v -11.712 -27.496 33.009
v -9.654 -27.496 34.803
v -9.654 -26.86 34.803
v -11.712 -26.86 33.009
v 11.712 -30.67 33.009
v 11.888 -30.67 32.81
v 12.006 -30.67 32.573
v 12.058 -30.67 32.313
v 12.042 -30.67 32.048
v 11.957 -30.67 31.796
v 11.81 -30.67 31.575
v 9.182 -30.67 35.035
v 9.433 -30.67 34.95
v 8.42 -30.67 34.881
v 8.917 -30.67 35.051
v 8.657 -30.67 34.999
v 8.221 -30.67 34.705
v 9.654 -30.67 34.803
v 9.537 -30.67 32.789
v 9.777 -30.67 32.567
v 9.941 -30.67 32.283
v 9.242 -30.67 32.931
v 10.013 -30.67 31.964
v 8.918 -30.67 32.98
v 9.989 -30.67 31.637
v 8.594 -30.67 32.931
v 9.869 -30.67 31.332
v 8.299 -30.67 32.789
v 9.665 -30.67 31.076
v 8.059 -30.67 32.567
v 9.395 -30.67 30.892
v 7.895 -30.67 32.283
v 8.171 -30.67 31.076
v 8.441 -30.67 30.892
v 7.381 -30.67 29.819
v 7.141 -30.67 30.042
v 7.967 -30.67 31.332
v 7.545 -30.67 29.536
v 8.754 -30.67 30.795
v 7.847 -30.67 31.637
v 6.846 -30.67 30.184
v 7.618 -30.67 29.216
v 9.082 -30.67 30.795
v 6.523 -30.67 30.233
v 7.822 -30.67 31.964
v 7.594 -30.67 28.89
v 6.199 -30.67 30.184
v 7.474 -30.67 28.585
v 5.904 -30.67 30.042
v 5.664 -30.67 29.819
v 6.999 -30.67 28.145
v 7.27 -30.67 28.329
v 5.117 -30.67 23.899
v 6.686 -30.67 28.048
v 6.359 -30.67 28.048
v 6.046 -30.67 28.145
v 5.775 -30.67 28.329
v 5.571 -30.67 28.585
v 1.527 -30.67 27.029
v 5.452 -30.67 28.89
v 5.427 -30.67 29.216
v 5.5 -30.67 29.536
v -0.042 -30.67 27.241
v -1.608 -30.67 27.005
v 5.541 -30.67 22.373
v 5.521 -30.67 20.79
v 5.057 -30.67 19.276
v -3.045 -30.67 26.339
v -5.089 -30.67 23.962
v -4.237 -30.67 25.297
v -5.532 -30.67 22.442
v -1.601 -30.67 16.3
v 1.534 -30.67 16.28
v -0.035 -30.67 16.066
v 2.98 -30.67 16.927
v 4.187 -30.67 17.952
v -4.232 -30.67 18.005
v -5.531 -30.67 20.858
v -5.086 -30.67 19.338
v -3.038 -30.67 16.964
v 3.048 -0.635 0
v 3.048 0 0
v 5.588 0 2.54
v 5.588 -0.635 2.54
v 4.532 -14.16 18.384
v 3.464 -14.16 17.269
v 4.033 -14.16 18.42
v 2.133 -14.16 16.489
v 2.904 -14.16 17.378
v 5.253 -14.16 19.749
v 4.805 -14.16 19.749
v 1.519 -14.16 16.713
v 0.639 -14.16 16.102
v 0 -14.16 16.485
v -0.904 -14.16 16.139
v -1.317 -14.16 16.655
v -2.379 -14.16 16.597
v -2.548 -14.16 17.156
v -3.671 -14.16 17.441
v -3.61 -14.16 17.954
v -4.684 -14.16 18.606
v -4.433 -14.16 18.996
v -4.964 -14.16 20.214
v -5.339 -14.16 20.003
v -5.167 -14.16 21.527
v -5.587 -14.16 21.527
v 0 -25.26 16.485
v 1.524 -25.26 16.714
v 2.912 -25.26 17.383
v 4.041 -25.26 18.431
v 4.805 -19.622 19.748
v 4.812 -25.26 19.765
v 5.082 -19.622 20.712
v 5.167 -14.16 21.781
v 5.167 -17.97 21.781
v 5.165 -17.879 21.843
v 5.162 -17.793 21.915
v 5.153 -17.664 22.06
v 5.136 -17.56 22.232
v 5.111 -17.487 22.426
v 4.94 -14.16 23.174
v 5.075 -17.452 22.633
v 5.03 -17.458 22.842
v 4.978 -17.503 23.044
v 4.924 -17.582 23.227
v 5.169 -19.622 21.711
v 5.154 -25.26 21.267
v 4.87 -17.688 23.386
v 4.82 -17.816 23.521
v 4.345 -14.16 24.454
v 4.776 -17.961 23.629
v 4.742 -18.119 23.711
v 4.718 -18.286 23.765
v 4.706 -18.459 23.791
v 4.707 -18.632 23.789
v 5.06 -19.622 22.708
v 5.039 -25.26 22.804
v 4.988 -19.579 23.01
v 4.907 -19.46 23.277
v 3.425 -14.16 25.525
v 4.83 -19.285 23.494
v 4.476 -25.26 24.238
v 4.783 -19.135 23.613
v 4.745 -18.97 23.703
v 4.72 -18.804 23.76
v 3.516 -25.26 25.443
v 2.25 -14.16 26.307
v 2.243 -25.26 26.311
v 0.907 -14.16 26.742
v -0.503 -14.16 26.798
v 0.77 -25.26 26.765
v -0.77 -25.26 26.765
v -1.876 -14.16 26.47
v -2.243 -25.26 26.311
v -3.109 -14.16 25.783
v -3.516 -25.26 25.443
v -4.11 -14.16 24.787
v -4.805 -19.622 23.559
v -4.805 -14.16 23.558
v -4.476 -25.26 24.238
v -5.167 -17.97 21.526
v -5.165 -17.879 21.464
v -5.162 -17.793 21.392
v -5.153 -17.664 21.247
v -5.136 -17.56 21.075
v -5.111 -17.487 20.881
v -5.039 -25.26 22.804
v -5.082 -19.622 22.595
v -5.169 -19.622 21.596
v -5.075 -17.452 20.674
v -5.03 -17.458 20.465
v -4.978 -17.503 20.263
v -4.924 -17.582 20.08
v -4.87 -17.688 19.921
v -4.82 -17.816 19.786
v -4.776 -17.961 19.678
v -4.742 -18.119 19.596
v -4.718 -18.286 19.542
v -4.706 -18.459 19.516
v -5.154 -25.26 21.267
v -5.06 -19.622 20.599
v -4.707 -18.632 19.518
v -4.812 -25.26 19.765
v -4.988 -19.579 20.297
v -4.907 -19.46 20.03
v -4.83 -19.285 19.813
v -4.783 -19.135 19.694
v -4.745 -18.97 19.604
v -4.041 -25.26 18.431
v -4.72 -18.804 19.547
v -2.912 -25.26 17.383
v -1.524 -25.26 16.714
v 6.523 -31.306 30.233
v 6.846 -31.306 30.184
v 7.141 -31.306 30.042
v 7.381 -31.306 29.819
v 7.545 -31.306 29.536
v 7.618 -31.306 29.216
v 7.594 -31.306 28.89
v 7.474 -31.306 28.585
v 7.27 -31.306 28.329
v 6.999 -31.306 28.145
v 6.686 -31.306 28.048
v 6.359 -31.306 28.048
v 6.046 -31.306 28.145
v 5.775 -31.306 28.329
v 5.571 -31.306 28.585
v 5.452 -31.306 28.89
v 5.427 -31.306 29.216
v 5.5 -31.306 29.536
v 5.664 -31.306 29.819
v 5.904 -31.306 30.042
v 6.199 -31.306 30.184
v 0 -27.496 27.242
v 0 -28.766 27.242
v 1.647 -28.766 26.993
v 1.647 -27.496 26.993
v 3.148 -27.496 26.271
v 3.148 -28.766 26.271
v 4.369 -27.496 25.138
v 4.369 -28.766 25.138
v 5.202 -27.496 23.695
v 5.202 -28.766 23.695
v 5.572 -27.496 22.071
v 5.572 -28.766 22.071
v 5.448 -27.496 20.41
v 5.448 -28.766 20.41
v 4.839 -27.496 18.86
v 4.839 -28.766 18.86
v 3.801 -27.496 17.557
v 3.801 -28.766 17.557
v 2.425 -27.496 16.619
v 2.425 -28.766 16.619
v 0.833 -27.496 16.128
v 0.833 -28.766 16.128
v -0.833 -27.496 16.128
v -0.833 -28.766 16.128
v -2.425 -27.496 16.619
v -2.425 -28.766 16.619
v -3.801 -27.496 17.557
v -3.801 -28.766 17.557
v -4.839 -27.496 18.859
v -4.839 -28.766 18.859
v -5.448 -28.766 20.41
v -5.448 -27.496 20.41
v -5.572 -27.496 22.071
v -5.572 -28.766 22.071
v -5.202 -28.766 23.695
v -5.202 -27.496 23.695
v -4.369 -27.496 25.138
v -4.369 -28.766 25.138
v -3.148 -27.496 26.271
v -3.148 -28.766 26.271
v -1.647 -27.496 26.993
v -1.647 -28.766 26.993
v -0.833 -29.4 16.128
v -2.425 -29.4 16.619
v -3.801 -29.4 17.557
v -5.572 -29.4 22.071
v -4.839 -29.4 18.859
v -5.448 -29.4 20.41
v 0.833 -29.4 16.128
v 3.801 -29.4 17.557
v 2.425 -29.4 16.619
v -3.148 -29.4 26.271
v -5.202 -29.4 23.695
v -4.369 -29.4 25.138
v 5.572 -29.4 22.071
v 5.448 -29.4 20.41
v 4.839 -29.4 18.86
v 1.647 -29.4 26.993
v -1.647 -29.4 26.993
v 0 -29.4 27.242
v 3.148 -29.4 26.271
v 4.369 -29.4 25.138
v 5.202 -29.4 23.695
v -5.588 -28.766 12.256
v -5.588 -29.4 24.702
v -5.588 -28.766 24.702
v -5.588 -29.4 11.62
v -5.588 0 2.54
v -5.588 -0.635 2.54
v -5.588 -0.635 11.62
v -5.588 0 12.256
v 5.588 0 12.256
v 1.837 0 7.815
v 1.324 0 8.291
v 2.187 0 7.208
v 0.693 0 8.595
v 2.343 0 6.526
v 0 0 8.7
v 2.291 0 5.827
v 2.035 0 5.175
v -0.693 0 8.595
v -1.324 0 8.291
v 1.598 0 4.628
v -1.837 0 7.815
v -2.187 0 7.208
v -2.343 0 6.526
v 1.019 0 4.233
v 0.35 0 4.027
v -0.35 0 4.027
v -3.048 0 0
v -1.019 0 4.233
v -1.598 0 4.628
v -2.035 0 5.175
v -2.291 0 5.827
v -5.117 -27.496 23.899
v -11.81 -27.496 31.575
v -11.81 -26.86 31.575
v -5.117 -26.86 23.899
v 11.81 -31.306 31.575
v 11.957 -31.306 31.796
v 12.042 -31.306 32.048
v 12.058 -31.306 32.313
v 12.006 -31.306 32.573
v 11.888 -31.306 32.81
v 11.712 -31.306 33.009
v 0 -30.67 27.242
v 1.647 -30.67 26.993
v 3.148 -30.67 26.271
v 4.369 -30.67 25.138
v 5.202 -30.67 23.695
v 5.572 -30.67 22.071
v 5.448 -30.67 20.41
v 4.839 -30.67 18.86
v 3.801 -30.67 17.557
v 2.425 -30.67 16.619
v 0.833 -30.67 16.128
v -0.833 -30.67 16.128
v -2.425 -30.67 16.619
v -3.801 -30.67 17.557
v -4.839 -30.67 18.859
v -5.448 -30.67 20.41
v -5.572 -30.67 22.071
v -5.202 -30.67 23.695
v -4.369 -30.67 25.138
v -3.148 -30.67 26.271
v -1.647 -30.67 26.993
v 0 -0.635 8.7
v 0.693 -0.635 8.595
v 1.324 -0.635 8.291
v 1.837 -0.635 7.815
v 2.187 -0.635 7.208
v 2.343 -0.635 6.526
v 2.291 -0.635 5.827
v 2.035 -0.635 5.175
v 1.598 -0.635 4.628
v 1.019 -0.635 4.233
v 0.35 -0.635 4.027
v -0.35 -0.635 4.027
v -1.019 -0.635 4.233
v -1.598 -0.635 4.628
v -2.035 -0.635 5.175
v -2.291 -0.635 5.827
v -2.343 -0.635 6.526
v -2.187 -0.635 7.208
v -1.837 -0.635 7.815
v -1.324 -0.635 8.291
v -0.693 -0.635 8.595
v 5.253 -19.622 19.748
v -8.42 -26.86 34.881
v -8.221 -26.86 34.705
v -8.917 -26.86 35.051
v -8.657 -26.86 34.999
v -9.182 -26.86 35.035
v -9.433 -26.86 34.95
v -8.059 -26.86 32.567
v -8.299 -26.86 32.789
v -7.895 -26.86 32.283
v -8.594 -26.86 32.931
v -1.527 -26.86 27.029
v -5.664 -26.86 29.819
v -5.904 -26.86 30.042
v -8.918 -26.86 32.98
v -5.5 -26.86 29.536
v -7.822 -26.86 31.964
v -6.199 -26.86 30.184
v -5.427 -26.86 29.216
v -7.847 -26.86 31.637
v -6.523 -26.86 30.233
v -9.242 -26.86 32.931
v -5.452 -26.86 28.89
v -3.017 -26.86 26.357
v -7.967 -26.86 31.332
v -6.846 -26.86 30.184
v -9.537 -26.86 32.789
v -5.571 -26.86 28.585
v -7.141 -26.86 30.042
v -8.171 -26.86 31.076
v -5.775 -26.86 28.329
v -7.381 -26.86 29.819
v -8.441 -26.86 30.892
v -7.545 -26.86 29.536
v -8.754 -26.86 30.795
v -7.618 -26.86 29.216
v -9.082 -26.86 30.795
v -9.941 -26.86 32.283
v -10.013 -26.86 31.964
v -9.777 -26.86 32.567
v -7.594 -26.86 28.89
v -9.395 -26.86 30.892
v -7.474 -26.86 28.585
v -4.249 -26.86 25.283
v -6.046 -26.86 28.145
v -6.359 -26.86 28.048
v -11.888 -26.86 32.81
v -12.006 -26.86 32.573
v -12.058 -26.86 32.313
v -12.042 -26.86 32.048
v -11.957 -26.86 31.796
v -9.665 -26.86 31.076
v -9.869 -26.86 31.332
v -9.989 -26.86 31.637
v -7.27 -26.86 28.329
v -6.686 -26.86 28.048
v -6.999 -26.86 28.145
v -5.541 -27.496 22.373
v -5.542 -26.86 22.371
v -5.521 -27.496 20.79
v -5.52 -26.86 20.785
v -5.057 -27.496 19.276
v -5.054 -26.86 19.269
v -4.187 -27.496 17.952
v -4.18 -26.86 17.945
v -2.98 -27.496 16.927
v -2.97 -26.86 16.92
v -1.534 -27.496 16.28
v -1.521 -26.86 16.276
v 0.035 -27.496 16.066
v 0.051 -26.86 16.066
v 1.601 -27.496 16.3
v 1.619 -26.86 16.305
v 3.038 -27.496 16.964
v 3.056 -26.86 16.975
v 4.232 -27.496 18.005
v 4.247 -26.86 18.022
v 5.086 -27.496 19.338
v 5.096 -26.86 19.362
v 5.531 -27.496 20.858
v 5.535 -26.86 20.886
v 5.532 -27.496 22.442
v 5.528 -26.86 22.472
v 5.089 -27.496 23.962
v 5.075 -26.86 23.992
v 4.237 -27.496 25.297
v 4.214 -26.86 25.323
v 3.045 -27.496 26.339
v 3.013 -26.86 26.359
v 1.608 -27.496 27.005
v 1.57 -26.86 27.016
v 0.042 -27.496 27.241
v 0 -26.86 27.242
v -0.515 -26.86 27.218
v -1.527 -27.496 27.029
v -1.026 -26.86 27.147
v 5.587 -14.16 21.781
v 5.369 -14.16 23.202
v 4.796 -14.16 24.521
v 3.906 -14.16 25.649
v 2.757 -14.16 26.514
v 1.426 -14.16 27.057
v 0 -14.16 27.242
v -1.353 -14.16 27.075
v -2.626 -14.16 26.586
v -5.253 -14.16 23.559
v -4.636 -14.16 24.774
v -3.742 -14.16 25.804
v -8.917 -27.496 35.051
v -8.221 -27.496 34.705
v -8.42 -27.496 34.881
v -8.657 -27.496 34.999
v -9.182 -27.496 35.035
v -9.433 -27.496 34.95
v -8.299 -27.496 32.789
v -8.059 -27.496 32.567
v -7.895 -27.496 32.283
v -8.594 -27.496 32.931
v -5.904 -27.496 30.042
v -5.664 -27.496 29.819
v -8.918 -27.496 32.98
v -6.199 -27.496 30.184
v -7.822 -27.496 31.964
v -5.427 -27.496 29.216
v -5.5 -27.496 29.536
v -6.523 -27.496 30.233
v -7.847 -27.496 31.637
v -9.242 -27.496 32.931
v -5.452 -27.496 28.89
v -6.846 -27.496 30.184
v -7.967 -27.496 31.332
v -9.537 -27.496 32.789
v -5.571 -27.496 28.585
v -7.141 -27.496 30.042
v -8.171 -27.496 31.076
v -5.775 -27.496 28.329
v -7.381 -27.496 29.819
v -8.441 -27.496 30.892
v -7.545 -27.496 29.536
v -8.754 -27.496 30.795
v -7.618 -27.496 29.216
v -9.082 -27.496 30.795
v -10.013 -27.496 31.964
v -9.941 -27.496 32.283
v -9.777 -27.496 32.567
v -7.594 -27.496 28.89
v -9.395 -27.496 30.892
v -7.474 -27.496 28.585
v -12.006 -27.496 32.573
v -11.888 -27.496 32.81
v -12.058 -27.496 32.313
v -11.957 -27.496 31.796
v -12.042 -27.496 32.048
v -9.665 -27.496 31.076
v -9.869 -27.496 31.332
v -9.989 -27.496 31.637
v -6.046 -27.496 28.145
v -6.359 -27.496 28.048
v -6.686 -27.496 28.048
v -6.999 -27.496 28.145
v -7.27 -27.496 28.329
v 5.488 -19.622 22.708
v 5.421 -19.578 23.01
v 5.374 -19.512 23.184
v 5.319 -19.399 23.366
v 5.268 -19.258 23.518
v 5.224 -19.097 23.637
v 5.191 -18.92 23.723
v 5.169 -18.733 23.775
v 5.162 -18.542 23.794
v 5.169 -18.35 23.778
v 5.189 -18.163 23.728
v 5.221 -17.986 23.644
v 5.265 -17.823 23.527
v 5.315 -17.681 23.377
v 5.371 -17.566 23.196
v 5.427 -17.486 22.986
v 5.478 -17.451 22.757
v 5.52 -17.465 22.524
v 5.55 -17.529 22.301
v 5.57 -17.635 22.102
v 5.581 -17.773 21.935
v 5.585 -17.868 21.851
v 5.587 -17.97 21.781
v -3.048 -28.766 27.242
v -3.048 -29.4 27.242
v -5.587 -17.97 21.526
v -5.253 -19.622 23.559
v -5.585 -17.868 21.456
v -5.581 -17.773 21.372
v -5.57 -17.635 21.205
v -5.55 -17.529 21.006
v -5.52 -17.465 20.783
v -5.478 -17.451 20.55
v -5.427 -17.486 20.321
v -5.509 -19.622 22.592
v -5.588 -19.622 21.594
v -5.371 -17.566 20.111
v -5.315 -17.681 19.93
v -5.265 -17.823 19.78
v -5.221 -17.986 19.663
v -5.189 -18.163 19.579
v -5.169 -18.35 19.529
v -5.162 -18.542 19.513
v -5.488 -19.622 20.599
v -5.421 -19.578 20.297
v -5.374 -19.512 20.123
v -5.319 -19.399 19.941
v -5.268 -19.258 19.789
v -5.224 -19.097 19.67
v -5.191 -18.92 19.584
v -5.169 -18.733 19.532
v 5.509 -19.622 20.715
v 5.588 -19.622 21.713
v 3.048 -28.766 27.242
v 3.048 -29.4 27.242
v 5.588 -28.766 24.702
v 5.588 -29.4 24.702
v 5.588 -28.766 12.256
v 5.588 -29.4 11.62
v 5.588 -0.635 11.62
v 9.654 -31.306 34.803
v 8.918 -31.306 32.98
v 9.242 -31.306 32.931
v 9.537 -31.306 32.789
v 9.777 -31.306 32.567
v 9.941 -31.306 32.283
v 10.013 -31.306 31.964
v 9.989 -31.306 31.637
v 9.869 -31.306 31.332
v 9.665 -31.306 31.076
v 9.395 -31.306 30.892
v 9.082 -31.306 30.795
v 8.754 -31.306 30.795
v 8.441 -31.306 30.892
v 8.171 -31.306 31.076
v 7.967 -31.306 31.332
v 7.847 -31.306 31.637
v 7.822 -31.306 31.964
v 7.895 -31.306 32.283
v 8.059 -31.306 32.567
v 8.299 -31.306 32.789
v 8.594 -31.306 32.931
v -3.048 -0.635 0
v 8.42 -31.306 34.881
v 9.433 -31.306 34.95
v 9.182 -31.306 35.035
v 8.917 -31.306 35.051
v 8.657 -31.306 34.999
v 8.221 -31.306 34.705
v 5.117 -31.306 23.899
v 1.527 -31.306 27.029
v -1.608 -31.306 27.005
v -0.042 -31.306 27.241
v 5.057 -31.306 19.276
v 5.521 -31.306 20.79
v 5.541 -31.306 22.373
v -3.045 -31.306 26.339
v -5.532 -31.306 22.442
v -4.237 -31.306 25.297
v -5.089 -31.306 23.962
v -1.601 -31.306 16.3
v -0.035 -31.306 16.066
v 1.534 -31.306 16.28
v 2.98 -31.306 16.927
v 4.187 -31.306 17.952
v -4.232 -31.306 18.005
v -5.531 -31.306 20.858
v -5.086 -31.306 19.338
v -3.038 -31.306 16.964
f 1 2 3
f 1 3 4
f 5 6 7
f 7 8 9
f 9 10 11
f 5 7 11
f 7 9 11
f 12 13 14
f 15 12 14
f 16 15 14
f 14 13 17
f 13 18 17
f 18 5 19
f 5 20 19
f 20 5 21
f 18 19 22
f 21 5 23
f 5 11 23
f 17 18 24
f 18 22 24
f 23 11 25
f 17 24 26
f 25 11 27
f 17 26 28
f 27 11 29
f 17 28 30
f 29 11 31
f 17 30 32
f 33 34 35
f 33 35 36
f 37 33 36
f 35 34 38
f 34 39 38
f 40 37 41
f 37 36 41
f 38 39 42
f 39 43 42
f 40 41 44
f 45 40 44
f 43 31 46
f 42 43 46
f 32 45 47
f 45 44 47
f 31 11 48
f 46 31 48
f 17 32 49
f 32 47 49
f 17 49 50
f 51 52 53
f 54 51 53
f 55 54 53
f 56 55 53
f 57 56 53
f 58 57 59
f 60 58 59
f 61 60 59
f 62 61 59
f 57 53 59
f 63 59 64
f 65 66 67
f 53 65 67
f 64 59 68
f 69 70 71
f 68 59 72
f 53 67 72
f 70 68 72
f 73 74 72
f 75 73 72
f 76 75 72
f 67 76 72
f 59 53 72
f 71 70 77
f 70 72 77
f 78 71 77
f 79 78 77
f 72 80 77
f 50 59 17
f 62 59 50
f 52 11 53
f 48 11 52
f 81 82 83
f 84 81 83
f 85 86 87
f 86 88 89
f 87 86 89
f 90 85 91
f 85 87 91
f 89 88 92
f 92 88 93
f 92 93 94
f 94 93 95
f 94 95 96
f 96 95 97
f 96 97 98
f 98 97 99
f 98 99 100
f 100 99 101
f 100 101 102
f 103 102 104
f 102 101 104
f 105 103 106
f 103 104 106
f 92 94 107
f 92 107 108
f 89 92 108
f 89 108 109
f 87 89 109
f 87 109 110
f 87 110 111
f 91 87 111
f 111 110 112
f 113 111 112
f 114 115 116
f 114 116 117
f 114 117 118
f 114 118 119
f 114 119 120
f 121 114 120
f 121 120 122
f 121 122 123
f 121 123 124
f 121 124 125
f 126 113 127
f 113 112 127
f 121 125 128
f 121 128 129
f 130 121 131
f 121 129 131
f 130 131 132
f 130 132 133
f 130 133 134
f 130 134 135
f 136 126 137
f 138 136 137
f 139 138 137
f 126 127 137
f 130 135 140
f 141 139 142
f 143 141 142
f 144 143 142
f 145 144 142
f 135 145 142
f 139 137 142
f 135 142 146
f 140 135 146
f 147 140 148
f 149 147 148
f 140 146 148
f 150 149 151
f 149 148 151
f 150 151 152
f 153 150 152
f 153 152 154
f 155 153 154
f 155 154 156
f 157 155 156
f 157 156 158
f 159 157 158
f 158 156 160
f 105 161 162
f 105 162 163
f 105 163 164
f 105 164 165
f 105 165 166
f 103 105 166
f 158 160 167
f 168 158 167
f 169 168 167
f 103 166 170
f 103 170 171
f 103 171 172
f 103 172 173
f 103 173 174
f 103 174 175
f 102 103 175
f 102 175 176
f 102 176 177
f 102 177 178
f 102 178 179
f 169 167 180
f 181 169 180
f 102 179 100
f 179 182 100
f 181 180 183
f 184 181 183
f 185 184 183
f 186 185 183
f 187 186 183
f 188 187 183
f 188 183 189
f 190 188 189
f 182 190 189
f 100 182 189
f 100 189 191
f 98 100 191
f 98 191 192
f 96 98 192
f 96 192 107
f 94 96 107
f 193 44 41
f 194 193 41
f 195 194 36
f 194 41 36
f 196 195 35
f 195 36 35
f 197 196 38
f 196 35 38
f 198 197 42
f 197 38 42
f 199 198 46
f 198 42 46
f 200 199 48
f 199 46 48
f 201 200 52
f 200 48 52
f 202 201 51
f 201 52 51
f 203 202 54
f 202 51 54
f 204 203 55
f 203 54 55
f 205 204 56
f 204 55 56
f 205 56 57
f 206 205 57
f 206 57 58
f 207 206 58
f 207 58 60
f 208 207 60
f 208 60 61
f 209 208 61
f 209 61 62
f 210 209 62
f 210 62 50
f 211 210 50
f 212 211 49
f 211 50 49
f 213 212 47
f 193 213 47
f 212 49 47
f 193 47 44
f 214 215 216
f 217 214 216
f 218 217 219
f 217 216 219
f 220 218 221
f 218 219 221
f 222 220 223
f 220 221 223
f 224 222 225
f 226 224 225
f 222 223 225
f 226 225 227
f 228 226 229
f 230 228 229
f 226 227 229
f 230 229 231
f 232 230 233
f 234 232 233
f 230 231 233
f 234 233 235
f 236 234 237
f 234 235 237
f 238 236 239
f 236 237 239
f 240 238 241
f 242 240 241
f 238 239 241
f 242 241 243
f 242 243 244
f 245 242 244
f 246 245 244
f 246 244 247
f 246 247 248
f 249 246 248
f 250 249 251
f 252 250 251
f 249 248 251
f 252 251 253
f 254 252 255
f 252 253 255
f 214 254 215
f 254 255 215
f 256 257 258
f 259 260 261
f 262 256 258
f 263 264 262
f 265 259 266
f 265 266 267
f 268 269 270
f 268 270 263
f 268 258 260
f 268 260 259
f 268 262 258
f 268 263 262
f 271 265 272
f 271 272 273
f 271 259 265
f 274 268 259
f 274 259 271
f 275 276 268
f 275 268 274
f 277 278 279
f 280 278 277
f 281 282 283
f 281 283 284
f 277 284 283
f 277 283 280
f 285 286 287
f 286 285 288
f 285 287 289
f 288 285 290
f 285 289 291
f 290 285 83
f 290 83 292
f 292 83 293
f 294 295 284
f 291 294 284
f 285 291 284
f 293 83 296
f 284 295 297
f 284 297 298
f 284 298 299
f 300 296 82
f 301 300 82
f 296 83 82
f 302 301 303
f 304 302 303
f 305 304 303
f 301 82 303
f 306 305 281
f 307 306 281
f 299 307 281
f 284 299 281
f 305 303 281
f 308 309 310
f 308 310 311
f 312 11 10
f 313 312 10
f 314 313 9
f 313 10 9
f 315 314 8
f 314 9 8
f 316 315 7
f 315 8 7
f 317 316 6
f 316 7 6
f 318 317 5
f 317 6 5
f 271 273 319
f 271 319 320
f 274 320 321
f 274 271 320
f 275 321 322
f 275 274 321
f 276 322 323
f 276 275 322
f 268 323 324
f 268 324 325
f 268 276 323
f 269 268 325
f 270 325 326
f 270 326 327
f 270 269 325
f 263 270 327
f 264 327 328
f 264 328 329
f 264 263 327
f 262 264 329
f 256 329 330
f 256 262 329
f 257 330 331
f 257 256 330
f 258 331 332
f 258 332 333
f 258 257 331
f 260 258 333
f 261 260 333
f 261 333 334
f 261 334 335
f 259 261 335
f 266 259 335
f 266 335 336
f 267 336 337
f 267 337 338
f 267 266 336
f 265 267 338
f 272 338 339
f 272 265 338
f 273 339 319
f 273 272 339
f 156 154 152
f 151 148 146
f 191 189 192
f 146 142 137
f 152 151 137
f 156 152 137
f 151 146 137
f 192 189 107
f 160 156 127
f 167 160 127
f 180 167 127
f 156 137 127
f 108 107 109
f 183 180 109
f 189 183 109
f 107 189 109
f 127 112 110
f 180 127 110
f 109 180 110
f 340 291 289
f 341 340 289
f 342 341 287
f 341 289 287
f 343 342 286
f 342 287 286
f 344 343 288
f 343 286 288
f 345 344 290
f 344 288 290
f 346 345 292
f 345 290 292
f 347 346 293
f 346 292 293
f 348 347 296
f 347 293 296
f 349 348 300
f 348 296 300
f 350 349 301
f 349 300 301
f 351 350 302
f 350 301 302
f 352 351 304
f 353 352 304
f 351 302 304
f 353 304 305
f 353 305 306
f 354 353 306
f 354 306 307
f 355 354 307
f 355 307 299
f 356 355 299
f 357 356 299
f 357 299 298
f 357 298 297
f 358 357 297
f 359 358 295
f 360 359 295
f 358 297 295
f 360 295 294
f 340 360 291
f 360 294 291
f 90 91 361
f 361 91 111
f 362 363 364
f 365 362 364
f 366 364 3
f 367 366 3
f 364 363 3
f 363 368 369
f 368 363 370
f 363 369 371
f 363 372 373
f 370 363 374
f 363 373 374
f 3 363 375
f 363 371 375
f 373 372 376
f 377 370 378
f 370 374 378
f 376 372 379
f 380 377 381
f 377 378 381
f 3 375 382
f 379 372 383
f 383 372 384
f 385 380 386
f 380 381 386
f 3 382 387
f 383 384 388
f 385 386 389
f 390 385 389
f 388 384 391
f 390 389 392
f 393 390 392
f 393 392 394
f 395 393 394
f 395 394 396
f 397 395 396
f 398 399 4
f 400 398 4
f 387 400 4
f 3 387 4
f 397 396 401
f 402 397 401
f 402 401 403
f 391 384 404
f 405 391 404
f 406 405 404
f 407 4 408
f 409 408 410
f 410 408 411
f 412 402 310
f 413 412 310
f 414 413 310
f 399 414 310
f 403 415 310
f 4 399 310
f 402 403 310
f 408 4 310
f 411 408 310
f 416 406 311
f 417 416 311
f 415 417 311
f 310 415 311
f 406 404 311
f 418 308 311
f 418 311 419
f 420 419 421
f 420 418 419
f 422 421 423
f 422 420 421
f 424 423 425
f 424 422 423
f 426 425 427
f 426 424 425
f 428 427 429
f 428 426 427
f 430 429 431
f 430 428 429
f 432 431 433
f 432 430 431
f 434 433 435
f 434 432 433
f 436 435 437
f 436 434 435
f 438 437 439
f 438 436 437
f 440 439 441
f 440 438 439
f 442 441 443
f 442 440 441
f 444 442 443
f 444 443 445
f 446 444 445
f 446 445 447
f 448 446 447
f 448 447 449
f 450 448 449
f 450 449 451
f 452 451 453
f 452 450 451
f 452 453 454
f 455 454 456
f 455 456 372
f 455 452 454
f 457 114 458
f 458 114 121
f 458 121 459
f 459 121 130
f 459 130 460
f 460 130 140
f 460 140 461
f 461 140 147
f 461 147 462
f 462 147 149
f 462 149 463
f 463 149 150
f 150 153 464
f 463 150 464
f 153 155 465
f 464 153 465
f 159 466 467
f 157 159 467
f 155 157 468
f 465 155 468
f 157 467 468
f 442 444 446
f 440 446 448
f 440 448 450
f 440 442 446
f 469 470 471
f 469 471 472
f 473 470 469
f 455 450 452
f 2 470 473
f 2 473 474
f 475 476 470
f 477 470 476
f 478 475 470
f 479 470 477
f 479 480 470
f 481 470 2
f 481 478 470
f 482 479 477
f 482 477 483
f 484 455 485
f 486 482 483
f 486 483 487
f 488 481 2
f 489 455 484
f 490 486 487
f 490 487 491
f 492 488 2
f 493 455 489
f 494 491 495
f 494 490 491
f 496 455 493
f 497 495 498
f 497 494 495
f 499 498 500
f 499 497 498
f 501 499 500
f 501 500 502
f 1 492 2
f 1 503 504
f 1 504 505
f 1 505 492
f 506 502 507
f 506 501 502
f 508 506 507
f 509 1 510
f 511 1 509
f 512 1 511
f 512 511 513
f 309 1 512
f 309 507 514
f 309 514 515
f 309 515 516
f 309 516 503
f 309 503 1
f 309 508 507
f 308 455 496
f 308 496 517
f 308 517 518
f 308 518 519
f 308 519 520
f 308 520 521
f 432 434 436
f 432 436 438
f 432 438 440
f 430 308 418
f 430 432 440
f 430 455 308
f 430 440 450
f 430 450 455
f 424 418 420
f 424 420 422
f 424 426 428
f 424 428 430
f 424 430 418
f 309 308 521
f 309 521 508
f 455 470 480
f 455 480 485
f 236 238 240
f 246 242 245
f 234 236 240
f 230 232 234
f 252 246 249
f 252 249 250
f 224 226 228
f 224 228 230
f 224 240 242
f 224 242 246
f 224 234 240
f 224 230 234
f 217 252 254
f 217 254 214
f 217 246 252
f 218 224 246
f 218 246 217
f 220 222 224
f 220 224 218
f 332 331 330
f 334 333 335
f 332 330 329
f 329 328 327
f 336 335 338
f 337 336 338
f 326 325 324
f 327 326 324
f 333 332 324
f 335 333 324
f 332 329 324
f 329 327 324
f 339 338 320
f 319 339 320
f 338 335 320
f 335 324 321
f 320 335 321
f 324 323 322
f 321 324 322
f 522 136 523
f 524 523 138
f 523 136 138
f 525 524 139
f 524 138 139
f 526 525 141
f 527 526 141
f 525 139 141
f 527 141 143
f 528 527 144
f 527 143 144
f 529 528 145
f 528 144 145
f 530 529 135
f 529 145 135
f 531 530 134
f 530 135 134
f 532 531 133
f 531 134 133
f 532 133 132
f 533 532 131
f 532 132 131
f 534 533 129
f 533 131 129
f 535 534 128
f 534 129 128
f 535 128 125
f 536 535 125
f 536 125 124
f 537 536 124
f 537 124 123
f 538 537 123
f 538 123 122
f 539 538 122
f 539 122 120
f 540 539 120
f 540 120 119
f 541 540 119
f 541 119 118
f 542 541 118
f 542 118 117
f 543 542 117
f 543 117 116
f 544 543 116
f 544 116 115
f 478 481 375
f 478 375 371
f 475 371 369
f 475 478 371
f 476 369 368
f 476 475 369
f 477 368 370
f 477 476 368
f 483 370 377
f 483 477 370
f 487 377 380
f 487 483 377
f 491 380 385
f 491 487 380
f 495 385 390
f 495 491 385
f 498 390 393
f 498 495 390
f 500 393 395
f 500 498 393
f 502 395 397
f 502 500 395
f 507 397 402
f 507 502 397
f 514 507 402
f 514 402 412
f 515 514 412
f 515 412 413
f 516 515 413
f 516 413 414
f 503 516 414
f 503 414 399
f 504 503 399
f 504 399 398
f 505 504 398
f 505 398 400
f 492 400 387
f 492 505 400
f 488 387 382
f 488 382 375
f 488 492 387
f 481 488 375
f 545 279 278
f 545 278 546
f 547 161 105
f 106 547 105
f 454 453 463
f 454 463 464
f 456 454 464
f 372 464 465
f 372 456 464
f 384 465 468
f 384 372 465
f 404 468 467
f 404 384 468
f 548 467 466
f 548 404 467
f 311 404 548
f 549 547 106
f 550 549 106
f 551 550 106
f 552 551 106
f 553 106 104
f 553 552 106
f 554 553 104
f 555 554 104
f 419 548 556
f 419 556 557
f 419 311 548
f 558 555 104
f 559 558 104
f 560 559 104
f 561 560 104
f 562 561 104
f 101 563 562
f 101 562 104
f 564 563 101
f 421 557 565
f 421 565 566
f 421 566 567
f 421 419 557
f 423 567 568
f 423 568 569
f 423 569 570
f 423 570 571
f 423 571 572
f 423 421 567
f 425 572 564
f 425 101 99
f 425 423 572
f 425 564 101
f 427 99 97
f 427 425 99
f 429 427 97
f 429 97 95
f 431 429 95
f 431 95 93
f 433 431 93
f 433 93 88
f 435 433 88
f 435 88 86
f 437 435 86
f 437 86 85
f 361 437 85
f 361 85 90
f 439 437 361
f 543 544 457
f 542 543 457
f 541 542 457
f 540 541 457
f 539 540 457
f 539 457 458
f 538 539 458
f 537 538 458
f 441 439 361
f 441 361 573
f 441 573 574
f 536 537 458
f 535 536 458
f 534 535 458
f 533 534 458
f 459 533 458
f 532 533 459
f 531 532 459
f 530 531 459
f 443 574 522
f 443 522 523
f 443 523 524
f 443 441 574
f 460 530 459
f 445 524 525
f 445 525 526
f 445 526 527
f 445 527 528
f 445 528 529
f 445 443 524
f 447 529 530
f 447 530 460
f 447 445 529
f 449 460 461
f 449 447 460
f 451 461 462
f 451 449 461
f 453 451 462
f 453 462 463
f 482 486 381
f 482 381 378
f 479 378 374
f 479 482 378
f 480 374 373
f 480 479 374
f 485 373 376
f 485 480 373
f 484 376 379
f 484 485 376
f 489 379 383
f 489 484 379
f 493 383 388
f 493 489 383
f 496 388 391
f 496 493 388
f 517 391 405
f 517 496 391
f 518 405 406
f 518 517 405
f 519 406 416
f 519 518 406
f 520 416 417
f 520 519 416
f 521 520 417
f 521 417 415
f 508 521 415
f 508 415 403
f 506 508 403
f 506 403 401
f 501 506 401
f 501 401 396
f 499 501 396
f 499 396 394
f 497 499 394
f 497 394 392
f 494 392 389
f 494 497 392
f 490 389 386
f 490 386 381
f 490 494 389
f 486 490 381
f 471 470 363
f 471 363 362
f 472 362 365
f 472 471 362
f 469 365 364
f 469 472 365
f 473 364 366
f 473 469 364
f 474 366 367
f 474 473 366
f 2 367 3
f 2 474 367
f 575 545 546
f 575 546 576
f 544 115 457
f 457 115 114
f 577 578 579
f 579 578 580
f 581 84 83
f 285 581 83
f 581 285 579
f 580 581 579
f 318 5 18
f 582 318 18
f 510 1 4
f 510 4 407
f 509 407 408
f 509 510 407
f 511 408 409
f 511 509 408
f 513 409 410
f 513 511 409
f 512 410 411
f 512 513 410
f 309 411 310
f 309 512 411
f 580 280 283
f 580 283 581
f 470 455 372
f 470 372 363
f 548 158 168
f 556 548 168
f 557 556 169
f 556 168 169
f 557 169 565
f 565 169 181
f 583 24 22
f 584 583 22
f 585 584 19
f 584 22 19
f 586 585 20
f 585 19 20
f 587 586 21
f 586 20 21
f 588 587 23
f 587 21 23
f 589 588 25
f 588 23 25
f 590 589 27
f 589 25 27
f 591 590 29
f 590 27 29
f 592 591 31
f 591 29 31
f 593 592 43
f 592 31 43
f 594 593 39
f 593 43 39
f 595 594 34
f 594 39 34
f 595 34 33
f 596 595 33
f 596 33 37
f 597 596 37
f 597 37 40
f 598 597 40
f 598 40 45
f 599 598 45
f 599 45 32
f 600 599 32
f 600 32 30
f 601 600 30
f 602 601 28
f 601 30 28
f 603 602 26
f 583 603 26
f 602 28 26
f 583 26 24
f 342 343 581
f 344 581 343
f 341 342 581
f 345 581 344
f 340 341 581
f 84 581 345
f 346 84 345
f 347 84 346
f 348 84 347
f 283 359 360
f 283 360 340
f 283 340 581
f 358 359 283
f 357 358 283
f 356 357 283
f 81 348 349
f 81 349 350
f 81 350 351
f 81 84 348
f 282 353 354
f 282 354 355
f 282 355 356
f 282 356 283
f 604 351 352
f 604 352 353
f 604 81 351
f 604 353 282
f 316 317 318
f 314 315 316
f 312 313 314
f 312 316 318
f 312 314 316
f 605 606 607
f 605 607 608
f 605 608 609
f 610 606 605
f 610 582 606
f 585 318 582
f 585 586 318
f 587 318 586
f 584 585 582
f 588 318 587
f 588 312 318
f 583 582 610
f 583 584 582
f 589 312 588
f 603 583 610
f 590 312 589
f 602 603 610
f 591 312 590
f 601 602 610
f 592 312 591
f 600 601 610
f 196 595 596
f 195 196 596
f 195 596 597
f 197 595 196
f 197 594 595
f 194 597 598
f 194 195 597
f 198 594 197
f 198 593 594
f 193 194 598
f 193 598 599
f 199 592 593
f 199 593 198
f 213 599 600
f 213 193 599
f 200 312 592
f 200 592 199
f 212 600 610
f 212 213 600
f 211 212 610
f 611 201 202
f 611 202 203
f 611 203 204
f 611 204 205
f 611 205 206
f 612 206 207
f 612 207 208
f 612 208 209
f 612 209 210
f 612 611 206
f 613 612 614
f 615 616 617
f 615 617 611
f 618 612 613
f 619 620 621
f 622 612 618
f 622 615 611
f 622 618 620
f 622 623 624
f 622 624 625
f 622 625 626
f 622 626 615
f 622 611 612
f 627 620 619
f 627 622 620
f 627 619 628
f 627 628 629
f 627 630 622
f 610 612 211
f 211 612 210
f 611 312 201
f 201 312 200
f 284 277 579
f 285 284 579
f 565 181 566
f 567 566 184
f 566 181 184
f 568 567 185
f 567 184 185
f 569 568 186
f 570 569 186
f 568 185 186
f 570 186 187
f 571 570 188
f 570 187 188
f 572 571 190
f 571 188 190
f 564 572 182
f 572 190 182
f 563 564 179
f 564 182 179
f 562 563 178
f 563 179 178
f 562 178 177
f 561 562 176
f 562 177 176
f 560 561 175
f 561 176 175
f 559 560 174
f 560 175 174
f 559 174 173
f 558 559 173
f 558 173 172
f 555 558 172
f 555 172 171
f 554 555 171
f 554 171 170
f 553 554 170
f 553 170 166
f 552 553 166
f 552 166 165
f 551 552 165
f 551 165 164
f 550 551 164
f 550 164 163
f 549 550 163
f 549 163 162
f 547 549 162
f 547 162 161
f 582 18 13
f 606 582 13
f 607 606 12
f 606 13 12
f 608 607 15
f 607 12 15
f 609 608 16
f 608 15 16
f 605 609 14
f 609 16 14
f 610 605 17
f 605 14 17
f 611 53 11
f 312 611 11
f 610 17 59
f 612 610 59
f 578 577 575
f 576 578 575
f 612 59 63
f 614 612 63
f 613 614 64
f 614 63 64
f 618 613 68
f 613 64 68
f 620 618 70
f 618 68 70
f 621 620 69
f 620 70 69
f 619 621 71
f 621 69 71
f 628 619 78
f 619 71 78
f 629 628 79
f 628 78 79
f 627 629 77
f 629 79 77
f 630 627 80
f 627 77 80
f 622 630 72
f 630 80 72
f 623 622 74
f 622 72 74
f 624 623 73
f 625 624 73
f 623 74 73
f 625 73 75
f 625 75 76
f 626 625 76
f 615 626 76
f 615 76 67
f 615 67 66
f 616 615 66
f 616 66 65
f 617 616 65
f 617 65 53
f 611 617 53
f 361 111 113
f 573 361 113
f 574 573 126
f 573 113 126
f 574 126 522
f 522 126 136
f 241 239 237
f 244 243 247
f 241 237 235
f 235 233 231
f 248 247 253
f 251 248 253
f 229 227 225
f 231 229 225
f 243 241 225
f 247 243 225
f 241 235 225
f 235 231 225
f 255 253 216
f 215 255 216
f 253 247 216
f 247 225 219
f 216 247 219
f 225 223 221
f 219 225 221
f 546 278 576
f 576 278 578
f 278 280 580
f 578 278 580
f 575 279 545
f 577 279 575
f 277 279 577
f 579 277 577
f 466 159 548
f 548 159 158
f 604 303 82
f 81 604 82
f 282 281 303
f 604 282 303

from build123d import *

# Parameters (mm, degrees)
SKETCH1_R           = 2.3495
BOSS_EXTRUDE1_DEPTH = 0.635
SKETCH2_W           = 11.176
SKETCH2_H           = 0.635
BOSS_EXTRUDE2_DEPTH = 28.7655
SKETCH3_W           = 11.176
SKETCH3_H           = 0.635
BOSS_EXTRUDE3_DEPTH = 14.986
CUT_EXTRUDE1_DEPTH  = 41.009737021
SKETCH5_R           = 5.588
BOSS_EXTRUDE4_DEPTH = 1.27
SKETCH6_R           = 1.09855
BOSS_EXTRUDE5_DEPTH = 0.635
SKETCH7_R           = 5.588
BOSS_EXTRUDE6_DEPTH = 1.27
SKETCH8_R           = 1.09855
BOSS_EXTRUDE7_DEPTH = 0.635
SKETCH9_R           = 5.588
SKETCH9_R_2         = 5.1689
BOSS_EXTRUDE8_DEPTH = 12.7
SKETCH10_R          = 5.1689
BOSS_EXTRUDE9_DEPTH = 1.6002
CUT_EXTRUDE2_DEPTH  = 49.520560567
CIRPATTERN1_COUNT   = 2


with BuildPart() as part:
    # Sketch1 → Boss-Extrude1 (new body)
    with BuildSketch(Plane(origin=(0, 0, 0), x_dir=(1, 0, 0), z_dir=(0, 1, 0))):
        Polygon((-3.048, 0), (3.048, 0), (5.588, -2.54), (5.588, -12.2555), (-5.588, -12.2555), (-5.588, -2.54), align=None)
        with Locations(Location((0, -6.35, 0), (0, 0, 270))):
            Circle(SKETCH1_R, mode=Mode.SUBTRACT)
    extrude(amount=-BOSS_EXTRUDE1_DEPTH)

    # Sketch2 → Boss-Extrude2 (add)
    with BuildSketch(Plane.XZ.offset(0.635)):
        with Locations((0, 11.938)):
            Rectangle(SKETCH2_W, SKETCH2_H)
    extrude(amount=BOSS_EXTRUDE2_DEPTH)

    # Sketch3 → Boss-Extrude3 (add)
    with BuildSketch(Plane.XY.offset(12.2555)):
        with Locations((0, -29.083)):
            Rectangle(SKETCH3_W, SKETCH3_H)
    extrude(amount=BOSS_EXTRUDE3_DEPTH)

    # Sketch4 → Cut-Extrude1 (cut, through all)
    with BuildSketch(Plane(origin=(0, -28.7655, 0), x_dir=(1, 0, 0), z_dir=(0, 1, 0))):
        Polygon((-5.588, -24.7015), (-3.048, -27.2415), (-5.588, -27.2415), align=None)
        Polygon((5.588, -27.2415), (5.588, -24.7015), (3.048, -27.2415), align=None)
    extrude(amount=-CUT_EXTRUDE1_DEPTH, mode=Mode.SUBTRACT)


with BuildPart() as body_2:
    # Sketch5 → Boss-Extrude4 (new body)
    with BuildSketch(Plane(origin=(0, -28.7655, 0), x_dir=(1, 0, 0), z_dir=(0, 1, 0))):
        with Locations(Location((0, -21.6535, 0), (0, 0, 270))):
            Circle(SKETCH5_R)
    extrude(amount=BOSS_EXTRUDE4_DEPTH)


with BuildPart() as body_3:
    # Sketch6 → Boss-Extrude5 (new body)
    with BuildSketch(Plane(origin=(0, -27.4955, 0), x_dir=(1, 0, 0), z_dir=(0, 1, 0))):
        with BuildLine():
            Line((-11.810256461, -31.57548538), (-5.117028214, -23.898887775))
            ThreePointArc((-5.117028214, -23.898887775), (3.672323944, -17.441638078), (-1.527373166, -27.028709318))
            Line((-1.527373166, -27.028709318), (-8.220601414, -34.705306923))
            ThreePointArc((-8.220601414, -34.705306923), (-8.917028861, -35.051240986), (-9.654089753, -34.803404738))
            Line((-9.654089753, -34.803404738), (-11.712158647, -33.00897372))
            ThreePointArc((-11.712158647, -33.00897372), (-12.05809271, -32.312546272), (-11.810256461, -31.57548538))
        make_face()
        with Locations(Location((-8.91790485, -31.881623782, 0), (0, 0, 270))):
            Circle(SKETCH6_R, mode=Mode.SUBTRACT)
        with Locations(Location((-6.522548095, -29.134341119, 0), (0, 0, 270))):
            Circle(SKETCH6_R, mode=Mode.SUBTRACT)
    extrude(amount=BOSS_EXTRUDE5_DEPTH)

    # Sketch9 → Boss-Extrude8 (add)
    with BuildSketch(Plane(origin=(0, -26.8605, 0), x_dir=(-1, 0, 0), z_dir=(0, -1, 0))):
        with Locations(Location((0, -21.6535, 0), (0, 0, 270))):
            Circle(SKETCH9_R)
        with Locations(Location((0, -21.6535, 0), (0, 0, 90))):
            Circle(SKETCH9_R_2, mode=Mode.SUBTRACT)
    extrude(amount=-BOSS_EXTRUDE8_DEPTH)

    # Sketch10 → Boss-Extrude9 (add)
    with BuildSketch(Plane(origin=(0, -26.8605, 0), x_dir=(-1, 0, 0), z_dir=(0, -1, 0))):
        with Locations(Location((0, -21.6535, 0), (0, 0, 90))):
            Circle(SKETCH10_R)
    extrude(amount=-BOSS_EXTRUDE9_DEPTH)

    # Sketch11 → Cut-Extrude2 (cut, through all)
    with BuildSketch(Plane(origin=(0, 0, 0), x_dir=(0, 0, -1), z_dir=(1, 0, 0))):
        with BuildLine():
            Line((-19.7485, -14.1605), (-19.7485, -19.6215))
            Line((-19.7485, -19.6215), (-22.707686982, -19.6215))
            ThreePointArc((-22.707686982, -19.6215), (-23.654454734, -18.003953613), (-21.7805, -17.9705))
            Line((-21.7805, -17.9705), (-21.7805, -14.1605))
            Line((-21.7805, -14.1605), (-19.7485, -14.1605))
        make_face()
    cut_extrude2 = extrude(amount=CUT_EXTRUDE2_DEPTH, mode=Mode.SUBTRACT)

    # CirPattern1: Cut-Extrude2 ×2 about axis
    cirpattern1_axis = Axis((0, -14.1605, 21.6535), (0, -1, 0))
    for i in range(1, CIRPATTERN1_COUNT):
        add(cut_extrude2.rotate(cirpattern1_axis, i * 360 / CIRPATTERN1_COUNT), mode=Mode.SUBTRACT)


with BuildPart() as body_4:
    # Sketch7 → Boss-Extrude6 (new body)
    with BuildSketch(Plane(origin=(0, -29.4005, 0), x_dir=(1, 0, 0), z_dir=(0, 1, 0))):
        with Locations(Location((0, -21.6535, 0), (0, 0, 270))):
            Circle(SKETCH7_R)
    extrude(amount=-BOSS_EXTRUDE6_DEPTH)


with BuildPart() as body_5:
    # Sketch8 → Boss-Extrude7 (new body)
    with BuildSketch(Plane(origin=(0, -30.6705, 0), x_dir=(1, 0, 0), z_dir=(0, 1, 0))):
        with BuildLine():
            Line((11.712158647, -33.00897372), (9.654089753, -34.803404738))
            ThreePointArc((9.654089753, -34.803404738), (8.917028861, -35.051240986), (8.220601414, -34.705306923))
            Line((8.220601414, -34.705306923), (1.527373166, -27.028709318))
            ThreePointArc((1.527373166, -27.028709318), (-3.672323944, -17.441638078), (5.117028214, -23.898887775))
            Line((5.117028214, -23.898887775), (11.810256461, -31.57548538))
            ThreePointArc((11.810256461, -31.57548538), (12.05809271, -32.312546272), (11.712158647, -33.00897372))
        make_face()
        with Locations(Location((6.522548095, -29.134341119, 0), (0, 0, 270))):
            Circle(SKETCH8_R, mode=Mode.SUBTRACT)
        with Locations(Location((8.91790485, -31.881623782, 0), (0, 0, 270))):
            Circle(SKETCH8_R, mode=Mode.SUBTRACT)
    extrude(amount=-BOSS_EXTRUDE7_DEPTH)


solid = Compound([part.part, body_2.part, body_3.part, body_4.part, body_5.part])
